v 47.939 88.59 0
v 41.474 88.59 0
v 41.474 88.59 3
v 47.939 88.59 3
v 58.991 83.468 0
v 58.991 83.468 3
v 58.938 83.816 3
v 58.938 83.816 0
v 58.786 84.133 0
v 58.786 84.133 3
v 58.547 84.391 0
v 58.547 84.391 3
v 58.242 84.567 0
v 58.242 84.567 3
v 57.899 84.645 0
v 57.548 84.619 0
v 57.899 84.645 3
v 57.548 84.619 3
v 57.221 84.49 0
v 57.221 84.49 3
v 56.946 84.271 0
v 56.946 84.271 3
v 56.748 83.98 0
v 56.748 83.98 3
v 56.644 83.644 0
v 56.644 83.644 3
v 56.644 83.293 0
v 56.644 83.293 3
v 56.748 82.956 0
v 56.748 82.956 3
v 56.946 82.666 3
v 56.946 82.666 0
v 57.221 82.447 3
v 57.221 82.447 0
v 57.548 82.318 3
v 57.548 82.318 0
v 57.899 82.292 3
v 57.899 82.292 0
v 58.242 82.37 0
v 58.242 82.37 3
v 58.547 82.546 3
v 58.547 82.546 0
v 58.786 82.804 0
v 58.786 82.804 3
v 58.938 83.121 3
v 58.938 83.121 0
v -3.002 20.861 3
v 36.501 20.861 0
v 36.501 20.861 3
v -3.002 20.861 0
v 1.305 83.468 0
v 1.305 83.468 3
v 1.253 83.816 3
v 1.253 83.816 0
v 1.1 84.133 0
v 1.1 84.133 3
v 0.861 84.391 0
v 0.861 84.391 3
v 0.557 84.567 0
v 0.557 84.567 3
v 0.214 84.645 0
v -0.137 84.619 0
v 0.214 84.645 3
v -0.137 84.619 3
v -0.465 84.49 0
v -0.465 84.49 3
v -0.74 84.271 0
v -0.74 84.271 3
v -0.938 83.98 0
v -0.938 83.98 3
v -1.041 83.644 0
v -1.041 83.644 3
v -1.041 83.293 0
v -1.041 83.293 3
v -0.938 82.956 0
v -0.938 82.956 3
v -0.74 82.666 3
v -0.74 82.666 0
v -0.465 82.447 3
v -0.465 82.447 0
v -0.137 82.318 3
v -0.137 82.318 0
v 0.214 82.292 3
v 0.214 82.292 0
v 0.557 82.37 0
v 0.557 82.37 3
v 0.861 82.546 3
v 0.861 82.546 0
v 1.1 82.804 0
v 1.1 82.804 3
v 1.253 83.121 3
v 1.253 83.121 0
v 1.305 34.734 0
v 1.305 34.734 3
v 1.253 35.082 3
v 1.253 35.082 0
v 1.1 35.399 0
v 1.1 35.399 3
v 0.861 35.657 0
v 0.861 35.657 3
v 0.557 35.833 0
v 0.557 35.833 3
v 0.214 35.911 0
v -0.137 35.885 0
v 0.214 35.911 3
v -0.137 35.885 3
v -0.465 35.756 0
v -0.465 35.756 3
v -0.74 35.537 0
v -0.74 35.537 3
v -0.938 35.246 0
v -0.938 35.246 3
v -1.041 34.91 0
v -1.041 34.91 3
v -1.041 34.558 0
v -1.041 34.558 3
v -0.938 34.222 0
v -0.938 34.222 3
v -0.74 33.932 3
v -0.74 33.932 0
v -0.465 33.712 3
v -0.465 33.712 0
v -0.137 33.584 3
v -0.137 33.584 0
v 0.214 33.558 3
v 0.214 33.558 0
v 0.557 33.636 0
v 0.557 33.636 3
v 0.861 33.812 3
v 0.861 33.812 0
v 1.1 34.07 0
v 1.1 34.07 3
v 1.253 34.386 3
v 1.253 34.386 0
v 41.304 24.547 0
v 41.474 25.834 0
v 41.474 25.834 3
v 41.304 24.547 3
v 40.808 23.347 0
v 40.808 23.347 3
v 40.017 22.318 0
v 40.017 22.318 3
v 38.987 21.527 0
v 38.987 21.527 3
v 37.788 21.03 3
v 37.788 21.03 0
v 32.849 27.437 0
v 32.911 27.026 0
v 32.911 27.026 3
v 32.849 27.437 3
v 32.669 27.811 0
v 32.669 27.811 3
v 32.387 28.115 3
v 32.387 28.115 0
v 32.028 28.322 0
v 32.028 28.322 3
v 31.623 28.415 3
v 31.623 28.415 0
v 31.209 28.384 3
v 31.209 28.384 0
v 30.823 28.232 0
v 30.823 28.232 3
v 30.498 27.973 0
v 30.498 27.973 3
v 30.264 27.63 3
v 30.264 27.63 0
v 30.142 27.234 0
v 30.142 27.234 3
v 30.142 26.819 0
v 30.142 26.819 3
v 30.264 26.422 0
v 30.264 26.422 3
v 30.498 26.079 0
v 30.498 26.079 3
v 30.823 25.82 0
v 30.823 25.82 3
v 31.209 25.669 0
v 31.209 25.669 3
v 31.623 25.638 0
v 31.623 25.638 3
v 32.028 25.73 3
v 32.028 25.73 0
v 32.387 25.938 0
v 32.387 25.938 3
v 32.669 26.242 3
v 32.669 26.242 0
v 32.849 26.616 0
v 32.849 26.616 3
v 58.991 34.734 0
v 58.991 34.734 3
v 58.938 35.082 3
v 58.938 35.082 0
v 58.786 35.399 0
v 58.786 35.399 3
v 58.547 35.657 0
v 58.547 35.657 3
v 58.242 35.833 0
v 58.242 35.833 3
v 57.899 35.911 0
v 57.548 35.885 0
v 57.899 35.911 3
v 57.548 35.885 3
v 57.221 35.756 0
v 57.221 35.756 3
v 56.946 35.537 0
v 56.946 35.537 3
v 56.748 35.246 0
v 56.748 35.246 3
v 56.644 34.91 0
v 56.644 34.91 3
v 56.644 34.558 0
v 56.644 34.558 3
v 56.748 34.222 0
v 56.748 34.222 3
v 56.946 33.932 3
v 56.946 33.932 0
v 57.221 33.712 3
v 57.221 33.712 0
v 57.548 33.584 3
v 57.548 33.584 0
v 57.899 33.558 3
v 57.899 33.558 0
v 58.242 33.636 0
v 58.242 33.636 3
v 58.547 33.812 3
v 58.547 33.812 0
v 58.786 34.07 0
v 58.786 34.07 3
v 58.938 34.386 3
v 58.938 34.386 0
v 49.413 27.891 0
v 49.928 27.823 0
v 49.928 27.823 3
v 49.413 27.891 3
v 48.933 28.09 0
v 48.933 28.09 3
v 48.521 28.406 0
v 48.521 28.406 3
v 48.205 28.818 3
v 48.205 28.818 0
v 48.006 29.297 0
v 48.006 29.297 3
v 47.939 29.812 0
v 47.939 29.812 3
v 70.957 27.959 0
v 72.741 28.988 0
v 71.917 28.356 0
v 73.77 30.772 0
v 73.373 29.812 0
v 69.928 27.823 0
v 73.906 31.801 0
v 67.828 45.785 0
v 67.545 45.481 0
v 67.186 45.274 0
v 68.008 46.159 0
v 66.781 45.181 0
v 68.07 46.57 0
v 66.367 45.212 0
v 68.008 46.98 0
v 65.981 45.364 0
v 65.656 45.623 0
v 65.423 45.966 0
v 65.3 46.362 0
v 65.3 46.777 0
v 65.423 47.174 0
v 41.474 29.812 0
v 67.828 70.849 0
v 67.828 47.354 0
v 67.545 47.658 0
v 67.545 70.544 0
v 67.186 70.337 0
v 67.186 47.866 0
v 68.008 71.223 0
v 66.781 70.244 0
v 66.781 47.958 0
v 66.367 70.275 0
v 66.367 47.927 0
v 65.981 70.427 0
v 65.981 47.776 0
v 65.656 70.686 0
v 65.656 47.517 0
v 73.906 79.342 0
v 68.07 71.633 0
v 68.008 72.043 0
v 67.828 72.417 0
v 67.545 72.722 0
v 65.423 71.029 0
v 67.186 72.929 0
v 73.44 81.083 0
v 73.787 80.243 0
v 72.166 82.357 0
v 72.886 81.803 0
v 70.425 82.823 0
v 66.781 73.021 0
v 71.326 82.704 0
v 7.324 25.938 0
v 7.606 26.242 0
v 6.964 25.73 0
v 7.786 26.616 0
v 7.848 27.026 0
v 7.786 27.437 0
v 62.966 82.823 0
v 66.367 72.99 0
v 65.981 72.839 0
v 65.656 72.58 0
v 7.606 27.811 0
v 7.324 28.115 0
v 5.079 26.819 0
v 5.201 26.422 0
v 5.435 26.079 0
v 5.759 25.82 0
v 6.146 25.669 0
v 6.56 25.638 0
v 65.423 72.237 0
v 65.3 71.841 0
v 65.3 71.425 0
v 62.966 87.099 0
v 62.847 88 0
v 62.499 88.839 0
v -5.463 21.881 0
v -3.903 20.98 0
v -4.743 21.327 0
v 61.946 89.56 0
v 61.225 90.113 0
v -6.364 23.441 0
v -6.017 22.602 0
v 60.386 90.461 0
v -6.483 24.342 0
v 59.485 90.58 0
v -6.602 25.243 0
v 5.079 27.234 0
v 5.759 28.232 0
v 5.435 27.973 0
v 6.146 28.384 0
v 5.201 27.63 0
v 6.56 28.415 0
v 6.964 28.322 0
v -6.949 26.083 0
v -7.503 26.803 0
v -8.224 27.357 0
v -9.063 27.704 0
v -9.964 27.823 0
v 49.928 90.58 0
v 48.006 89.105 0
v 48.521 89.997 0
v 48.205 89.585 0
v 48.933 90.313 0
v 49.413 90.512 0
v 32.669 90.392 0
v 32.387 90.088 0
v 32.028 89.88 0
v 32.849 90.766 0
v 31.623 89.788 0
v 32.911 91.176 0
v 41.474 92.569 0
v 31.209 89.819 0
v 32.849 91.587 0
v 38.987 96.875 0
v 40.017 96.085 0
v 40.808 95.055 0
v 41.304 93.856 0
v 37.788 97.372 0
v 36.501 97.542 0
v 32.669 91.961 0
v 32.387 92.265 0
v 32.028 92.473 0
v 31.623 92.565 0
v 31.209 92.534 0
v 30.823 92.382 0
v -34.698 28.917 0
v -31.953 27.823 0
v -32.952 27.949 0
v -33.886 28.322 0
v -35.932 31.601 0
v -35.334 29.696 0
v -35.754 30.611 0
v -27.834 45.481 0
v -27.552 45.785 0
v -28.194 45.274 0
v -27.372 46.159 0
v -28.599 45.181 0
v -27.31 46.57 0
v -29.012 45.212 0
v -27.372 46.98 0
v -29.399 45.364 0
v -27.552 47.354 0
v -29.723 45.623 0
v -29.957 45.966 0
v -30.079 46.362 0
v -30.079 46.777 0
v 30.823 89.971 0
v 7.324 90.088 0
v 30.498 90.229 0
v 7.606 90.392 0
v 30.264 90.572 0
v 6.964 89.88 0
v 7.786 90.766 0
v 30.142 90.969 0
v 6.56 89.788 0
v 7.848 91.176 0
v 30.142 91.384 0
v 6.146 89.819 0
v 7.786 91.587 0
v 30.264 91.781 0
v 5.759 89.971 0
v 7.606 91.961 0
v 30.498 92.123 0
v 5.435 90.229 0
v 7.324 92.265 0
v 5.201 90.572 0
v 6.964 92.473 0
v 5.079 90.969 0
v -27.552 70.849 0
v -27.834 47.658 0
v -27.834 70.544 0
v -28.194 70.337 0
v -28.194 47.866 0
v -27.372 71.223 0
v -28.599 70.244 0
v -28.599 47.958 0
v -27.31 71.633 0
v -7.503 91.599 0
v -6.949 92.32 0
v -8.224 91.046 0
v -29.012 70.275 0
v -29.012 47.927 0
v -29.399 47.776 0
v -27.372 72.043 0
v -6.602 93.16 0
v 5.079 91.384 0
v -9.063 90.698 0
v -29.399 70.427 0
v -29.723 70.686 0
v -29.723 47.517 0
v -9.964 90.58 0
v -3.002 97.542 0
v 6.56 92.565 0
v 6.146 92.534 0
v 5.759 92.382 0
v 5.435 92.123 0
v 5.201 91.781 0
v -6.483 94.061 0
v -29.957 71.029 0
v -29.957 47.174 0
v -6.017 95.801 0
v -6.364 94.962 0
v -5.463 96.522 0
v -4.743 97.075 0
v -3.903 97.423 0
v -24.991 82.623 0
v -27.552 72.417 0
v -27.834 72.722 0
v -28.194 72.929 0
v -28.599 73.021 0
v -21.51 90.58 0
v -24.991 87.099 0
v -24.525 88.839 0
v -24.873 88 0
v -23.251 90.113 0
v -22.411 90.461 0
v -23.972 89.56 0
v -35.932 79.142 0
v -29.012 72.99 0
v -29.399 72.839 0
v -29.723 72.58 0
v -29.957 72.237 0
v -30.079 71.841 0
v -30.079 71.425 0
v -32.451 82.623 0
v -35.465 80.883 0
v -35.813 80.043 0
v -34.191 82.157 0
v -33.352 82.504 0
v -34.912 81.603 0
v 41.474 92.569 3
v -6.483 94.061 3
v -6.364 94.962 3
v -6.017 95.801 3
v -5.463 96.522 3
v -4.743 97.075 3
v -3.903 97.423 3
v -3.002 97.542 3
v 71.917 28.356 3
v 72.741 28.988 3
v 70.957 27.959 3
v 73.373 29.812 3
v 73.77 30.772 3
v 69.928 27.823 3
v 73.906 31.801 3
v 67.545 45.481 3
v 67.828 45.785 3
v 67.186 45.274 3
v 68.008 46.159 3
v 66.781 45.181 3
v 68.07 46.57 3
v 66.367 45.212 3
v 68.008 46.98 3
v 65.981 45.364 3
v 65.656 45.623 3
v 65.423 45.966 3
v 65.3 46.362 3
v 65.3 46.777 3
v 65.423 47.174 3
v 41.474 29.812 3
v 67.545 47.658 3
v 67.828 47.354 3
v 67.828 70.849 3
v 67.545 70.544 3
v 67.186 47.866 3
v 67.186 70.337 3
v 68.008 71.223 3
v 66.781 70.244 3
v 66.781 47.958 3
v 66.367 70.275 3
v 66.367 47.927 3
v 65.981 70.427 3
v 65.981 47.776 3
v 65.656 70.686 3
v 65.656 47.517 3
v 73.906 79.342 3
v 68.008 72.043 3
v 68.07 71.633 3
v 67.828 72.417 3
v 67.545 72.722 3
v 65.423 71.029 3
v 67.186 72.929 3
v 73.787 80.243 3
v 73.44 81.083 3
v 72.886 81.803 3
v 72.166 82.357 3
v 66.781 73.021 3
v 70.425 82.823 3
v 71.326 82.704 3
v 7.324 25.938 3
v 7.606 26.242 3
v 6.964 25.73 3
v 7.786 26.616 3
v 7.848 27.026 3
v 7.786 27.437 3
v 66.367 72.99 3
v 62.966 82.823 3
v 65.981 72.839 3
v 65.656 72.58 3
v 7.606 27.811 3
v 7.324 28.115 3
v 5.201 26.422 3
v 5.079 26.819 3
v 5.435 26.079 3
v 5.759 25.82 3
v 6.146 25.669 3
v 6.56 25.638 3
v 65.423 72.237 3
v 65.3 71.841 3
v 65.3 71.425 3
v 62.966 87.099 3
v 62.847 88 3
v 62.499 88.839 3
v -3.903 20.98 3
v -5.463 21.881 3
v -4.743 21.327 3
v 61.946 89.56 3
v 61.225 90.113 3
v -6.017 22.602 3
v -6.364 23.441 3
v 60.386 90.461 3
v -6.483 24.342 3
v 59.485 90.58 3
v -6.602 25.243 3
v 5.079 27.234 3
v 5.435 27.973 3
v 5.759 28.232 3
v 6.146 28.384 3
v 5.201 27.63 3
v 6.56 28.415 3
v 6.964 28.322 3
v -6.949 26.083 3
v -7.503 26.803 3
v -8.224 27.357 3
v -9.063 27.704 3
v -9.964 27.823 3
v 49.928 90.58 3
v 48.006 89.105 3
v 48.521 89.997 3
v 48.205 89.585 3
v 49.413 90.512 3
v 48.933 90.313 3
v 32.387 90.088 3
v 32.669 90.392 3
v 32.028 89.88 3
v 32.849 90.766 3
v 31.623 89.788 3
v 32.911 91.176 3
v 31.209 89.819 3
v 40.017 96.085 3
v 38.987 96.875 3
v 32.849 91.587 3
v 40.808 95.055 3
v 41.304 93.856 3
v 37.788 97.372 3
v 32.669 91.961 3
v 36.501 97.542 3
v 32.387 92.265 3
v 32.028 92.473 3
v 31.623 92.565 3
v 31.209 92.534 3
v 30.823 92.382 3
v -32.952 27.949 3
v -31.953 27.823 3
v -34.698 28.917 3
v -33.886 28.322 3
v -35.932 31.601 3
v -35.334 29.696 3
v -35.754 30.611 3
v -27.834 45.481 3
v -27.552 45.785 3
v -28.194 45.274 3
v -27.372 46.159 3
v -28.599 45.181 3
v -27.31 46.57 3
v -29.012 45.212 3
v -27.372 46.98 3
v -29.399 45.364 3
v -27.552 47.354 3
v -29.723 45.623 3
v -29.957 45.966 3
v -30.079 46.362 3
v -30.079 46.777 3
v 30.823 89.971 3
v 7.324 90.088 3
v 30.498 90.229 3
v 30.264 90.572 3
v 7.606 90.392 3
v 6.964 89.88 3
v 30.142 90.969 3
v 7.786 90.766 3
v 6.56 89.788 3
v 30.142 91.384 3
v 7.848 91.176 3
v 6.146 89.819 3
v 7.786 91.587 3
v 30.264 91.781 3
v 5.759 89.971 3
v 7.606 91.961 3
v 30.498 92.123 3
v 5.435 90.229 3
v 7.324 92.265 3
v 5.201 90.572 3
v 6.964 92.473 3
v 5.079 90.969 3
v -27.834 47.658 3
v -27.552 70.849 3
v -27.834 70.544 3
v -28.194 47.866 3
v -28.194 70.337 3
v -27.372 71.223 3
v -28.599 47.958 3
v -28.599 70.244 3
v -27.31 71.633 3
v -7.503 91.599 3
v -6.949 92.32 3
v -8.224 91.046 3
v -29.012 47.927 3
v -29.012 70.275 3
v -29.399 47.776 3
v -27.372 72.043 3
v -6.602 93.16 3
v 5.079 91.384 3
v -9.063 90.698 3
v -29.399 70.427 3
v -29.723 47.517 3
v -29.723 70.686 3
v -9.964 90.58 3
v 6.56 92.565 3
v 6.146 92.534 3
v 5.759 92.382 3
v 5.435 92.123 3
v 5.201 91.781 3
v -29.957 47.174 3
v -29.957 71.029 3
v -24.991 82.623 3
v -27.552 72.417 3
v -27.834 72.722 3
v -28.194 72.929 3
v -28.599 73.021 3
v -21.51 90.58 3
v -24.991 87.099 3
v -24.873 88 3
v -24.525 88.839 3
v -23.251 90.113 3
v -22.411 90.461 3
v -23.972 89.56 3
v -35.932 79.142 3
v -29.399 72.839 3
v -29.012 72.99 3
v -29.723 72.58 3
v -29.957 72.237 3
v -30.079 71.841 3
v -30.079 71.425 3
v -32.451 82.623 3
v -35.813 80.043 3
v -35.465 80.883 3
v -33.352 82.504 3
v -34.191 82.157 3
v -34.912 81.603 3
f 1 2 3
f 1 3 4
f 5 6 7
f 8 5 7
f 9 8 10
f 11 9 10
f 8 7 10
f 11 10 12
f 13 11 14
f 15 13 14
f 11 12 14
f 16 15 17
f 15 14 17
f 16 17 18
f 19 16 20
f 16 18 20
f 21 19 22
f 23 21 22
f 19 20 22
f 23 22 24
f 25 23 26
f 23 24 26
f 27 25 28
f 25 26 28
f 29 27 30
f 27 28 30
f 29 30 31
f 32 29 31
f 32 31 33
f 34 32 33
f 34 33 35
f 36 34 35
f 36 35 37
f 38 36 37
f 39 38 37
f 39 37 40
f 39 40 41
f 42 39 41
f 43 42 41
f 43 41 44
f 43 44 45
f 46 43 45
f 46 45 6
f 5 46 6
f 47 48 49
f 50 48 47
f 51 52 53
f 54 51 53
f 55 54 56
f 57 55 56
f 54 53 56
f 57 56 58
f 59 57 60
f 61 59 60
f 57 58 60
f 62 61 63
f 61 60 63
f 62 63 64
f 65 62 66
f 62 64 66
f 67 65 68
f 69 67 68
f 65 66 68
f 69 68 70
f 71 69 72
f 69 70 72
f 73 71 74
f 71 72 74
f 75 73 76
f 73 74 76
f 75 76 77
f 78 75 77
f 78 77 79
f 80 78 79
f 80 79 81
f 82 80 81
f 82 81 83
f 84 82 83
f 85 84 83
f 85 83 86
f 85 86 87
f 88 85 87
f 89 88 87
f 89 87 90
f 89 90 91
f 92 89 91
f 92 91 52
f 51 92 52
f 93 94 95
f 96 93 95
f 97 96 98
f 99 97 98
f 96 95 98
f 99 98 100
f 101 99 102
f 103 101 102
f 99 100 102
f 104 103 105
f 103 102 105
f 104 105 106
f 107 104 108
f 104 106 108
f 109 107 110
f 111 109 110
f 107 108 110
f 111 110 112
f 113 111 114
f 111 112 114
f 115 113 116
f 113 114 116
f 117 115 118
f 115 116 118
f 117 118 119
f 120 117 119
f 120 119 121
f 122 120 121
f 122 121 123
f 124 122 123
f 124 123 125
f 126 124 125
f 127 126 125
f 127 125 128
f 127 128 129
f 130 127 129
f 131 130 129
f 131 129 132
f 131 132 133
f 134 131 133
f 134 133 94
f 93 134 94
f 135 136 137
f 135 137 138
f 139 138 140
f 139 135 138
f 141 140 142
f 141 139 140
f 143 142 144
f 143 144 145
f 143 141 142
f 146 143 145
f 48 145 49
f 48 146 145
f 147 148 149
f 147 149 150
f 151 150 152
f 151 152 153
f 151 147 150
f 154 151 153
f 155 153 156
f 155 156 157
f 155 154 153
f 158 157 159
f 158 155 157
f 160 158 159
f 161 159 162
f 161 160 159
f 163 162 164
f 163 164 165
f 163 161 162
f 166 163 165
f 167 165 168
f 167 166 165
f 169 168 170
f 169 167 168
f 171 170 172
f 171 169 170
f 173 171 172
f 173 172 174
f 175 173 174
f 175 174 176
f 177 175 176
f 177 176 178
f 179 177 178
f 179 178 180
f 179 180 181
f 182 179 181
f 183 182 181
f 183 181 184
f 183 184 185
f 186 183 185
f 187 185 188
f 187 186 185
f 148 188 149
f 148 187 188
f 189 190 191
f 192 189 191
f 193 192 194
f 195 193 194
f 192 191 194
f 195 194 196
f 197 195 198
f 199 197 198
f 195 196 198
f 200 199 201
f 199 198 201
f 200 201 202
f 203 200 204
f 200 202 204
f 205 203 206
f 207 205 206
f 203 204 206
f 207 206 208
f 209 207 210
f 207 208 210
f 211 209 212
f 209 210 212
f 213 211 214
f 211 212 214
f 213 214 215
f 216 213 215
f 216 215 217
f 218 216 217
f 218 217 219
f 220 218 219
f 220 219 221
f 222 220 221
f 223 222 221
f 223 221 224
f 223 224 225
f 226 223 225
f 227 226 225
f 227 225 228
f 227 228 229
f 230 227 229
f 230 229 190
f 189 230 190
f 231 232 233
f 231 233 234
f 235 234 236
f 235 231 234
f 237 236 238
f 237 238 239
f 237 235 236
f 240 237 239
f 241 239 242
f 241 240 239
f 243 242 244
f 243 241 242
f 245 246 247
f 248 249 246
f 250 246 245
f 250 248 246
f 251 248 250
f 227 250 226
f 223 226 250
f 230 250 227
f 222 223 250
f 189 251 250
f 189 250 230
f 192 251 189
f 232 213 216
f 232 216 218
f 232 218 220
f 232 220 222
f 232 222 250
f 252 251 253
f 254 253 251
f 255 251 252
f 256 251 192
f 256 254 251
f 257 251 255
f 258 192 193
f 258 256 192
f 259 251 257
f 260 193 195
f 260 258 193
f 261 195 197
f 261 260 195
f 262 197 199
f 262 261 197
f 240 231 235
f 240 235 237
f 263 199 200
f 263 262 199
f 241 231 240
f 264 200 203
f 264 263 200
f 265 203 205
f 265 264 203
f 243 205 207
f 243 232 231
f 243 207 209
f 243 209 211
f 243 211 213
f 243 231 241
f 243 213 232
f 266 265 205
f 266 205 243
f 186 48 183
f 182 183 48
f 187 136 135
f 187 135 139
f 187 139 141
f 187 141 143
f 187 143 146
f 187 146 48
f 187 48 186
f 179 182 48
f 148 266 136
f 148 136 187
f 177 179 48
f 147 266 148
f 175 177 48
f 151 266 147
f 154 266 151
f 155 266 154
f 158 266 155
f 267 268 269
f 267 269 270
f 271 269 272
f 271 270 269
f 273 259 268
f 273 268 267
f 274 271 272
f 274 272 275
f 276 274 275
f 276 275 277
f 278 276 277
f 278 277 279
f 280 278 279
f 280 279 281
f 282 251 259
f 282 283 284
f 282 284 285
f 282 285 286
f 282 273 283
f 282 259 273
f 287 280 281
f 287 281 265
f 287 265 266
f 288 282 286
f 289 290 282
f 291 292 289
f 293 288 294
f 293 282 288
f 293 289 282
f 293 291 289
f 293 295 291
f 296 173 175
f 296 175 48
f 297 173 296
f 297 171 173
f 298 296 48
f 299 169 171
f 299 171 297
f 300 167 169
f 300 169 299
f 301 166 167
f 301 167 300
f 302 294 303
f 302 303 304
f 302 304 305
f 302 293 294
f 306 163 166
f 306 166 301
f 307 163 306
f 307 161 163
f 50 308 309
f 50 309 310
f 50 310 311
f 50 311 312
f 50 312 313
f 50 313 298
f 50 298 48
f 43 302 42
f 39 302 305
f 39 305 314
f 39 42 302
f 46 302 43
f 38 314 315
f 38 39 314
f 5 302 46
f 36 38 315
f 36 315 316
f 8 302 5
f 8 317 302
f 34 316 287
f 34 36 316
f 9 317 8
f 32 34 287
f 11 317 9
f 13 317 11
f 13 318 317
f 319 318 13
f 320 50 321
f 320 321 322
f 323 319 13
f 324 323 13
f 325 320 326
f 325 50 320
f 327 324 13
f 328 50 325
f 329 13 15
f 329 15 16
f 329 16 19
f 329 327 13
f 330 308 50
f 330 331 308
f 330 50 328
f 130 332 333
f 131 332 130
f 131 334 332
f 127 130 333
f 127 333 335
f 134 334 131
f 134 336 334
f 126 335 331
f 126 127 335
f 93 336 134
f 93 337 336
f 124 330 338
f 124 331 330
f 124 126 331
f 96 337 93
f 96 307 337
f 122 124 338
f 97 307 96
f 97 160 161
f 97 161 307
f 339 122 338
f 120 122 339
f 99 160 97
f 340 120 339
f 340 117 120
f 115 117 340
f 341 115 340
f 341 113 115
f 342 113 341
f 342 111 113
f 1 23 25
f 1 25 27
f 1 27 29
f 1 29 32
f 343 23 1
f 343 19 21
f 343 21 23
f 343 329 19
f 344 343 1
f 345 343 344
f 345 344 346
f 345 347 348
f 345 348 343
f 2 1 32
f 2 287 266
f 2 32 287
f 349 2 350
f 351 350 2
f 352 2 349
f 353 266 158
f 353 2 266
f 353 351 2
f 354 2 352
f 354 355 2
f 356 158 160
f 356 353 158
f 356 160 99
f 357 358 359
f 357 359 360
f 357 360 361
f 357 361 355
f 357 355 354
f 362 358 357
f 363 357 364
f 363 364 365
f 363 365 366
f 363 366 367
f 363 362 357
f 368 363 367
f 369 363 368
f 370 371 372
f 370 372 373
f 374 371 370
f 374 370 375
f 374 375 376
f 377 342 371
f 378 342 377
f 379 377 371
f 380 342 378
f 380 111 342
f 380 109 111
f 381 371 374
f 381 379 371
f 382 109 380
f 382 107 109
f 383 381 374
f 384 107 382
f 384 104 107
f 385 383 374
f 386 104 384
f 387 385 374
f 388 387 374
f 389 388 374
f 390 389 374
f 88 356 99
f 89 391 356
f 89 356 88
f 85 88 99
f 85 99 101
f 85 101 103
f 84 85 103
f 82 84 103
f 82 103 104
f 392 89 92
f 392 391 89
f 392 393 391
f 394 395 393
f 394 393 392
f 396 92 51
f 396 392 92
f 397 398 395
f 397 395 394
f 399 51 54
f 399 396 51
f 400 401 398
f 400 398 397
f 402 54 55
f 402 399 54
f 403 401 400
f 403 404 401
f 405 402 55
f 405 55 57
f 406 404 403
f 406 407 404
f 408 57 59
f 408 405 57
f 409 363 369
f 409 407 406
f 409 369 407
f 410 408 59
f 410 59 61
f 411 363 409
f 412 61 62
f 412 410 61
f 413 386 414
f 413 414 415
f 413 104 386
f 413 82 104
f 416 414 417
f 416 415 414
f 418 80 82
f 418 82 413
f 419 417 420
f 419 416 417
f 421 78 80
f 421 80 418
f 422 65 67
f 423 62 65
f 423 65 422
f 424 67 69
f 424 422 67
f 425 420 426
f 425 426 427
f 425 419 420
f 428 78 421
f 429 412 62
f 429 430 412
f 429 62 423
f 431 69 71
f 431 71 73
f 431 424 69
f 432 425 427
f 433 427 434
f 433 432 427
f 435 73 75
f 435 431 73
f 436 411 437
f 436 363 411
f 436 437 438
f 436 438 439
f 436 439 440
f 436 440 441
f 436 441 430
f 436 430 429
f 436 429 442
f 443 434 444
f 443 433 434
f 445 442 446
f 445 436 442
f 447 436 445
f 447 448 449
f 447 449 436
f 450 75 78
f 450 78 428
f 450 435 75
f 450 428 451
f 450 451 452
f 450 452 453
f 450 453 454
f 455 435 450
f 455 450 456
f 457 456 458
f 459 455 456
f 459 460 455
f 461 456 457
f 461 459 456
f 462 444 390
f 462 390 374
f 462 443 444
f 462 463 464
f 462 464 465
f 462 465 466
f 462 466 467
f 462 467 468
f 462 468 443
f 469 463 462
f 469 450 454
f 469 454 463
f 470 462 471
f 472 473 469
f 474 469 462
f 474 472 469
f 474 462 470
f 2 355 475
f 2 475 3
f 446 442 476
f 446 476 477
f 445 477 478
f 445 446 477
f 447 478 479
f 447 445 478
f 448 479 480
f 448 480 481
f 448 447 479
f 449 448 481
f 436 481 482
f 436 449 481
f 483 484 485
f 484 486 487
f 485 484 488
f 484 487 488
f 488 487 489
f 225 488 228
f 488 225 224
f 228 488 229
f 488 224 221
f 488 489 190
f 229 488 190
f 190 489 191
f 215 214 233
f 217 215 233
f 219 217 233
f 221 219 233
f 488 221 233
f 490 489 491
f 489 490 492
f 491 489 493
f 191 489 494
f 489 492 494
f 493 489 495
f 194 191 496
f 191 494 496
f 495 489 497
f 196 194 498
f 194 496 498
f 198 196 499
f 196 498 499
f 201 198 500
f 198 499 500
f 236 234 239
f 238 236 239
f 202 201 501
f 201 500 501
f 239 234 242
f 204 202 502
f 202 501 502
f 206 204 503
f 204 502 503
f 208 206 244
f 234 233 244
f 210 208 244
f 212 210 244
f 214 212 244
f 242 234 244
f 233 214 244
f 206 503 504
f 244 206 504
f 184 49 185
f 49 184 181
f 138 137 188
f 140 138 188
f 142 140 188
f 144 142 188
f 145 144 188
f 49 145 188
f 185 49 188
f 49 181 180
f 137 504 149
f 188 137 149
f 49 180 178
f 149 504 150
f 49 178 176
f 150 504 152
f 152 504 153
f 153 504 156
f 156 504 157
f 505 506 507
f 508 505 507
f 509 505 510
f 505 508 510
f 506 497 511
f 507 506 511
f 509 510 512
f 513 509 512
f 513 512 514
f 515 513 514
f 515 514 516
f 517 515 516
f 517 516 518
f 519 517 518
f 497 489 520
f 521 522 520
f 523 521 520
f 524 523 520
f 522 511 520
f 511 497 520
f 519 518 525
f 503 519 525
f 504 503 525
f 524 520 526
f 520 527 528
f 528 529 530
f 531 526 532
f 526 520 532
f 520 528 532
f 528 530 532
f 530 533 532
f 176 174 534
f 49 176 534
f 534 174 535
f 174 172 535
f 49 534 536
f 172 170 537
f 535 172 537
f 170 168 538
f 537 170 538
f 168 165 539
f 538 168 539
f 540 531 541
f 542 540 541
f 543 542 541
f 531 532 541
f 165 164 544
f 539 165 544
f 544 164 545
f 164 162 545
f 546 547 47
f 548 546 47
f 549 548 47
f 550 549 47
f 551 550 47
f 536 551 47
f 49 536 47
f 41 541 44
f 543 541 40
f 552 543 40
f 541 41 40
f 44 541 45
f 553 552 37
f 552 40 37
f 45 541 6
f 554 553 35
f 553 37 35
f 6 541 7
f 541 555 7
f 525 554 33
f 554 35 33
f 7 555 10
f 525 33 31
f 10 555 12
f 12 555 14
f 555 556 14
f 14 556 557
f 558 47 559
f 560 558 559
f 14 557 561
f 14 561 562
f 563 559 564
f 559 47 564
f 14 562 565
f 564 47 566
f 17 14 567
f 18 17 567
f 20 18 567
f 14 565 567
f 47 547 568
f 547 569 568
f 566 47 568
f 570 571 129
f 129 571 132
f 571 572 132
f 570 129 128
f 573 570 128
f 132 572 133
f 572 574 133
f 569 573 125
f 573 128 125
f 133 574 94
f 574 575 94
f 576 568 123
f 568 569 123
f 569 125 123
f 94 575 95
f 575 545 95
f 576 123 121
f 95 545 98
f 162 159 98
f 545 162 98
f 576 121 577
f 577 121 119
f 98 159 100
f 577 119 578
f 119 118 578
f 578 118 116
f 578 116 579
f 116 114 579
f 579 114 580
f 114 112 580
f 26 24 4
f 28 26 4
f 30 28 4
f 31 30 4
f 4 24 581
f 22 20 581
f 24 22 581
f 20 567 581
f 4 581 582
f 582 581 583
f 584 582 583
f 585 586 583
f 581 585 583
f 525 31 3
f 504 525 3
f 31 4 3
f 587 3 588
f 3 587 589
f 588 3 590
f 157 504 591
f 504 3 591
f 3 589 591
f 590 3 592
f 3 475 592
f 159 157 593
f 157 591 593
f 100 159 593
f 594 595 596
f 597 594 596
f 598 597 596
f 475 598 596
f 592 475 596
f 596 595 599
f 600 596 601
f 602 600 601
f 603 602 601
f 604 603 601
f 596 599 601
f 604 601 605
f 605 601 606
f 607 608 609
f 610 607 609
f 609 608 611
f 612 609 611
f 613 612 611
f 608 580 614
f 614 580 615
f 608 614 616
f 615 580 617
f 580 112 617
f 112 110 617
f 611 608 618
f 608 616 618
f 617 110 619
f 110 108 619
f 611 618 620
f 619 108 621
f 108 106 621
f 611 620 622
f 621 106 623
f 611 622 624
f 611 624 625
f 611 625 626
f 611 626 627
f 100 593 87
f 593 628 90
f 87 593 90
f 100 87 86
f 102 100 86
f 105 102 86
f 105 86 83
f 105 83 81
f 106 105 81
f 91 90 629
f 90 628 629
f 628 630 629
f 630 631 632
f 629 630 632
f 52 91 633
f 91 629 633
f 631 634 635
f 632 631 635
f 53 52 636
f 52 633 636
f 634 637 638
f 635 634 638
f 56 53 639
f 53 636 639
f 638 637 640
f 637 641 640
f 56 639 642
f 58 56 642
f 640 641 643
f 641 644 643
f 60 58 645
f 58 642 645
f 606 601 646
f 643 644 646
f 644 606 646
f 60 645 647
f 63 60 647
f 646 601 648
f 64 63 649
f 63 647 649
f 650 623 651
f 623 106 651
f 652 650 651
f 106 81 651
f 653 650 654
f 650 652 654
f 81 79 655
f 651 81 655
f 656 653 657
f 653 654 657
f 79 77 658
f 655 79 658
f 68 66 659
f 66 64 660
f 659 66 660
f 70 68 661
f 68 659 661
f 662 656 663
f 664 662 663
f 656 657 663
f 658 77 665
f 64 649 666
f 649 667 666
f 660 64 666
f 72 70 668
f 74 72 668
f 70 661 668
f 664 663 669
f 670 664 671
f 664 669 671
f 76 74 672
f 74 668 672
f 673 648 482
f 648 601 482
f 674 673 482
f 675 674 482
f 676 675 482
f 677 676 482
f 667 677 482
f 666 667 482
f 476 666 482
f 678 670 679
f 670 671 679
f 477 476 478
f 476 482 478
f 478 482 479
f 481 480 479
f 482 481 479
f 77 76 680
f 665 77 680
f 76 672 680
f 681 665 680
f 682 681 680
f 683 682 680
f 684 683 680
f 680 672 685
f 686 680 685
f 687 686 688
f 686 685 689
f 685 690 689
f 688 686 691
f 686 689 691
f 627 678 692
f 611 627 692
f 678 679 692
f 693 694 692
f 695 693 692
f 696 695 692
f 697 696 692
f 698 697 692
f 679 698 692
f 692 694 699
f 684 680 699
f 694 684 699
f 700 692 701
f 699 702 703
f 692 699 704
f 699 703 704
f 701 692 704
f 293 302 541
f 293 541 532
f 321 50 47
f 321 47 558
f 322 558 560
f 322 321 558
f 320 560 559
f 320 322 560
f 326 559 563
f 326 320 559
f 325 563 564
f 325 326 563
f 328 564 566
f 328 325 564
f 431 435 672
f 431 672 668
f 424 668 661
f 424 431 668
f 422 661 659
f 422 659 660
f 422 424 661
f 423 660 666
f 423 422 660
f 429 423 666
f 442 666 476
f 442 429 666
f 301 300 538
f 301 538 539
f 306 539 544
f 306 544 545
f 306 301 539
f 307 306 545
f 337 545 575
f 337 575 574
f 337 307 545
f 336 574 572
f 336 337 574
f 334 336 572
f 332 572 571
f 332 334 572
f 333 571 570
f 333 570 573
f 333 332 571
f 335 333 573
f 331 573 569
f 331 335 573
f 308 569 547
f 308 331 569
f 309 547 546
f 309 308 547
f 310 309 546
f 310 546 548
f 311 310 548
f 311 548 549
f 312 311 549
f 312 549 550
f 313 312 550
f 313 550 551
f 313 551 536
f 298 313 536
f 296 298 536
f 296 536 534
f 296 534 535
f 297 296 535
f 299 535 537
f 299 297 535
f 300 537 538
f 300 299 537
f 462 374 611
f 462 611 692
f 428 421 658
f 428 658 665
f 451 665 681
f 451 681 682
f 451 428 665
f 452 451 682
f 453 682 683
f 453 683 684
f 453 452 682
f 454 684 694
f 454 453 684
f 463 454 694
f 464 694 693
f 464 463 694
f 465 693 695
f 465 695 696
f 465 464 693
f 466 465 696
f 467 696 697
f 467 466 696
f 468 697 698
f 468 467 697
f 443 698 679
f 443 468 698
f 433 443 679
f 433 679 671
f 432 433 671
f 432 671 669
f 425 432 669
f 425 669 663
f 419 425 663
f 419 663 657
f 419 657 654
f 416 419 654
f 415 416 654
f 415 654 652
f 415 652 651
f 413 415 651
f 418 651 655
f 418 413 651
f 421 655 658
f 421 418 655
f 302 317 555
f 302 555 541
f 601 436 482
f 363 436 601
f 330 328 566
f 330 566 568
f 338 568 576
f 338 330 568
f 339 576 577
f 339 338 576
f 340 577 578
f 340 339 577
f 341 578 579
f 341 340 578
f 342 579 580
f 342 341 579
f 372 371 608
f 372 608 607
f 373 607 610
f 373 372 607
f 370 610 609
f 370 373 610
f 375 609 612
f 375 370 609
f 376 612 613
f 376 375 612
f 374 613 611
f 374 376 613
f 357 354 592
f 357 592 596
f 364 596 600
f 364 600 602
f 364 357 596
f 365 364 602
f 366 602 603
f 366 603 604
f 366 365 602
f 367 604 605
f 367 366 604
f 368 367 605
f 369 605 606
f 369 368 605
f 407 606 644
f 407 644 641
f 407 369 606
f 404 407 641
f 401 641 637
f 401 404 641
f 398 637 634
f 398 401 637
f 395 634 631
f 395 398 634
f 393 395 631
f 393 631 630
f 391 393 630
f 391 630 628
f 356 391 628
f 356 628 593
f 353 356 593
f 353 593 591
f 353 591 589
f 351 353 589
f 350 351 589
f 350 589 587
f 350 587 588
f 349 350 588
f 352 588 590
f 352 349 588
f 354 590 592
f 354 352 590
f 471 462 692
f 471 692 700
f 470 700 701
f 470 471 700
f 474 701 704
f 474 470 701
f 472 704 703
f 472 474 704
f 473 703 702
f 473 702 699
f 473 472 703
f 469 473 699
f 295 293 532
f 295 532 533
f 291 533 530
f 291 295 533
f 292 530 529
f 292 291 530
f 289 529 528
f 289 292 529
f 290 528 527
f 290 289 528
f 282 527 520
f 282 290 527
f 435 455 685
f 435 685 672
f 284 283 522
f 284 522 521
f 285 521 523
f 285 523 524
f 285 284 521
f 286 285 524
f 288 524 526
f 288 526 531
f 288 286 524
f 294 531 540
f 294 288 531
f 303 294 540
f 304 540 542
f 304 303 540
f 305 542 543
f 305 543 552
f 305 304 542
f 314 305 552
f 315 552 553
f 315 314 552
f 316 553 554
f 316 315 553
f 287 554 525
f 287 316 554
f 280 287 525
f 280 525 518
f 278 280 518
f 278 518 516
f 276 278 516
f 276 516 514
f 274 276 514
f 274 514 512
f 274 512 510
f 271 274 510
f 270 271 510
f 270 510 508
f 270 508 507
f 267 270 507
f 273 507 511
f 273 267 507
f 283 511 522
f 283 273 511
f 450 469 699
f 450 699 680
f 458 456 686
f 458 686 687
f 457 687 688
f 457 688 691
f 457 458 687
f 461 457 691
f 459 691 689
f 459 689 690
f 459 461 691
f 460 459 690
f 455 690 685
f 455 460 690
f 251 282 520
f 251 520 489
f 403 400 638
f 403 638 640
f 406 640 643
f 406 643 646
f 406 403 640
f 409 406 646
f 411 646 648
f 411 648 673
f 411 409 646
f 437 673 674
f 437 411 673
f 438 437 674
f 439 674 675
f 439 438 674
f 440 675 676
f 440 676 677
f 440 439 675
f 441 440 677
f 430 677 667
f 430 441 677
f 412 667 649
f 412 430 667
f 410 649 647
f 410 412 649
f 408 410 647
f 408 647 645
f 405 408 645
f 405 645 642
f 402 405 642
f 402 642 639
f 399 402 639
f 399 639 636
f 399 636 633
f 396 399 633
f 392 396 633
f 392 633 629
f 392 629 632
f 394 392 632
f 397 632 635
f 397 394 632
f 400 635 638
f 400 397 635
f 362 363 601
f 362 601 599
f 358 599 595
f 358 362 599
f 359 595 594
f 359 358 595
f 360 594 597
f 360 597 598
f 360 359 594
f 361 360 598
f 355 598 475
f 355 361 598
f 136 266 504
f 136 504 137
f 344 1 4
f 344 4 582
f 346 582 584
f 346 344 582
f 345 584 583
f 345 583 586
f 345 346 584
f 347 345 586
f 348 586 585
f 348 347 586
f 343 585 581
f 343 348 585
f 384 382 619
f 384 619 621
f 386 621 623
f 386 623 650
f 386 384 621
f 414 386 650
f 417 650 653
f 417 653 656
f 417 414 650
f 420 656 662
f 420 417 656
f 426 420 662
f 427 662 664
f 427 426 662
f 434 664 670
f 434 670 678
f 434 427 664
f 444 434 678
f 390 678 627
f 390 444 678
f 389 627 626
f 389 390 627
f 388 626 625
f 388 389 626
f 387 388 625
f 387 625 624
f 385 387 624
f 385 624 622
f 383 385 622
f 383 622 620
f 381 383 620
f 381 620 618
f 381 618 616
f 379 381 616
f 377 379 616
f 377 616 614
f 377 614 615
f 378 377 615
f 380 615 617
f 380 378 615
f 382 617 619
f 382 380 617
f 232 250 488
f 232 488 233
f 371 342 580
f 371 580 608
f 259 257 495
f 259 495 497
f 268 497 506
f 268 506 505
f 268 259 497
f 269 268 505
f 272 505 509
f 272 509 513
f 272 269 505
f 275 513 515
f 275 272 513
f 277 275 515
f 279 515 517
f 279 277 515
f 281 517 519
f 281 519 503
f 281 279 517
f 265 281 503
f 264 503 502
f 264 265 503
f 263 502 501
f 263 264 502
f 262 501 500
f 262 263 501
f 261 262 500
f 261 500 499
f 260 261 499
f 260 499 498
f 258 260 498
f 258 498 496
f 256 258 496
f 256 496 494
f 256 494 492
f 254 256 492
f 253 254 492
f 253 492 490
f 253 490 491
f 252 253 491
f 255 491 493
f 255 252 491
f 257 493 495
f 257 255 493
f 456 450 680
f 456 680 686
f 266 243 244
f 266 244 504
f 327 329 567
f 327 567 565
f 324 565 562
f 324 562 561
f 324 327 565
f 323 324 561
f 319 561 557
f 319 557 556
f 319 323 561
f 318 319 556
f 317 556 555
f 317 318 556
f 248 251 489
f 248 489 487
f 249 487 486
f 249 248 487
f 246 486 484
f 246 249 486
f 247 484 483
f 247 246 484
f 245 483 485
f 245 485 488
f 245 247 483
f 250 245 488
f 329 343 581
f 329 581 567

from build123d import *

# Parameters (mm, degrees)
CROQUIS1_R              = 1.392405063
CROQUIS1_R_2            = 1.113924051
SALIENTE_EXTRUIR1_DEPTH = 3
CROQUIS8_R              = 1.18
CORTAR_EXTRUIR1_DEPTH   = 10


with BuildPart() as part:
    # Croquis1 → Saliente-Extruir1 (new body)
    with BuildSketch(Plane.XY):
        with BuildLine():
            Line((73.906046363, 79.342028473), (73.906046363, 31.801341312))
            ThreePointArc((73.906046363, 31.801341312), (72.740829217, 28.988258277), (69.927746182, 27.823041131))
            Line((69.927746182, 27.823041131), (49.927651758, 27.823041131))
            ThreePointArc((49.927651758, 27.823041131), (48.521110241, 28.405649704), (47.938501668, 29.812191222))
            Line((47.938501668, 29.812191222), (41.473763874, 29.812191222))
            Line((41.473763874, 29.812191222), (41.473763874, 25.833891041))
            ThreePointArc((41.473763874, 25.833891041), (40.017242442, 22.317537246), (36.500888648, 20.861015815))
            Line((36.500888648, 20.861015815), (-3.002012677, 20.861015815))
            ThreePointArc((-3.002012677, 20.861015815), (-5.463460333, 21.880580817), (-6.483025335, 24.342028473))
            ThreePointArc((-6.483025335, 24.342028473), (-7.502590337, 26.803476129), (-9.964037993, 27.823041131))
            Line((-9.964037993, 27.823041131), (-31.953282507, 27.823041131))
            ThreePointArc((-31.953282507, 27.823041131), (-34.697951359, 28.916679938), (-35.931582688, 31.601341312))
            Line((-35.931582688, 31.601341312), (-35.931582688, 79.142028473))
            ThreePointArc((-35.931582688, 79.142028473), (-34.912017686, 81.603476129), (-32.45057003, 82.623041131))
            Line((-32.45057003, 82.623041131), (-24.991257191, 82.623041131))
            Line((-24.991257191, 82.623041131), (-24.991257191, 87.098628835))
            ThreePointArc((-24.991257191, 87.098628835), (-23.971692189, 89.560076491), (-21.510244533, 90.579641493))
            Line((-21.510244533, 90.579641493), (-9.964037993, 90.579641493))
            ThreePointArc((-9.964037993, 90.579641493), (-7.502590337, 91.599206495), (-6.483025335, 94.060654151))
            ThreePointArc((-6.483025335, 94.060654151), (-5.463460333, 96.522101807), (-3.002012677, 97.541666809))
            Line((-3.002012677, 97.541666809), (36.500888648, 97.541666809))
            ThreePointArc((36.500888648, 97.541666809), (40.017242442, 96.085145378), (41.473763874, 92.568791583))
            Line((41.473763874, 92.568791583), (41.473763874, 88.590491402))
            Line((41.473763874, 88.590491402), (47.938501668, 88.590491402))
            ThreePointArc((47.938501668, 88.590491402), (48.521110241, 89.99703292), (49.927651758, 90.579641493))
            Line((49.927651758, 90.579641493), (59.484708207, 90.579641493))
            ThreePointArc((59.484708207, 90.579641493), (61.946155863, 89.560076491), (62.965720865, 87.098628835))
            Line((62.965720865, 87.098628835), (62.965720865, 82.823041131))
            Line((62.965720865, 82.823041131), (70.425033704, 82.823041131))
            ThreePointArc((70.425033704, 82.823041131), (72.886481361, 81.803476129), (73.906046363, 79.342028473))
        make_face()
        with Locations((-28.70264158, 46.569695742)):
            Circle(CROQUIS1_R, mode=Mode.SUBTRACT)
        with Locations((-28.70264158, 71.632986882)):
            Circle(CROQUIS1_R, mode=Mode.SUBTRACT)
        with Locations((66.677105255, 46.569695742)):
            Circle(CROQUIS1_R, mode=Mode.SUBTRACT)
        with Locations((66.677105255, 71.632986882)):
            Circle(CROQUIS1_R, mode=Mode.SUBTRACT)
        with Locations((6.455586268, 91.17638652)):
            Circle(CROQUIS1_R, mode=Mode.SUBTRACT)
        with Locations((31.518877407, 91.17638652)):
            Circle(CROQUIS1_R, mode=Mode.SUBTRACT)
        with Locations((6.455586268, 27.026296104)):
            Circle(CROQUIS1_R, mode=Mode.SUBTRACT)
        with Locations((31.518877407, 27.026296104)):
            Circle(CROQUIS1_R, mode=Mode.SUBTRACT)
        with Locations((0.125454864, 83.46842992)):
            Circle(CROQUIS1_R_2, mode=Mode.SUBTRACT)
        with Locations((0.125454864, 34.734252705)):
            Circle(CROQUIS1_R_2, mode=Mode.SUBTRACT)
        with Locations((57.810807486, 34.734252705)):
            Circle(CROQUIS1_R_2, mode=Mode.SUBTRACT)
        with Locations((57.810807486, 83.46842992)):
            Circle(CROQUIS1_R_2, mode=Mode.SUBTRACT)
    extrude(amount=SALIENTE_EXTRUIR1_DEPTH)

    # Croquis8 → Cortar-Extruir1 (cut)
    with BuildSketch(Plane.XY.offset(3)):
        with Locations((0.125454864, 34.734252705)):
            Circle(CROQUIS8_R)
        with Locations((57.810807486, 34.734252705)):
            Circle(CROQUIS8_R)
        with Locations((0.125454864, 83.46842992)):
            Circle(CROQUIS8_R)
        with Locations((57.810807486, 83.46842992)):
            Circle(CROQUIS8_R)
    extrude(amount=-CORTAR_EXTRUIR1_DEPTH, mode=Mode.SUBTRACT)


solid = part.part
